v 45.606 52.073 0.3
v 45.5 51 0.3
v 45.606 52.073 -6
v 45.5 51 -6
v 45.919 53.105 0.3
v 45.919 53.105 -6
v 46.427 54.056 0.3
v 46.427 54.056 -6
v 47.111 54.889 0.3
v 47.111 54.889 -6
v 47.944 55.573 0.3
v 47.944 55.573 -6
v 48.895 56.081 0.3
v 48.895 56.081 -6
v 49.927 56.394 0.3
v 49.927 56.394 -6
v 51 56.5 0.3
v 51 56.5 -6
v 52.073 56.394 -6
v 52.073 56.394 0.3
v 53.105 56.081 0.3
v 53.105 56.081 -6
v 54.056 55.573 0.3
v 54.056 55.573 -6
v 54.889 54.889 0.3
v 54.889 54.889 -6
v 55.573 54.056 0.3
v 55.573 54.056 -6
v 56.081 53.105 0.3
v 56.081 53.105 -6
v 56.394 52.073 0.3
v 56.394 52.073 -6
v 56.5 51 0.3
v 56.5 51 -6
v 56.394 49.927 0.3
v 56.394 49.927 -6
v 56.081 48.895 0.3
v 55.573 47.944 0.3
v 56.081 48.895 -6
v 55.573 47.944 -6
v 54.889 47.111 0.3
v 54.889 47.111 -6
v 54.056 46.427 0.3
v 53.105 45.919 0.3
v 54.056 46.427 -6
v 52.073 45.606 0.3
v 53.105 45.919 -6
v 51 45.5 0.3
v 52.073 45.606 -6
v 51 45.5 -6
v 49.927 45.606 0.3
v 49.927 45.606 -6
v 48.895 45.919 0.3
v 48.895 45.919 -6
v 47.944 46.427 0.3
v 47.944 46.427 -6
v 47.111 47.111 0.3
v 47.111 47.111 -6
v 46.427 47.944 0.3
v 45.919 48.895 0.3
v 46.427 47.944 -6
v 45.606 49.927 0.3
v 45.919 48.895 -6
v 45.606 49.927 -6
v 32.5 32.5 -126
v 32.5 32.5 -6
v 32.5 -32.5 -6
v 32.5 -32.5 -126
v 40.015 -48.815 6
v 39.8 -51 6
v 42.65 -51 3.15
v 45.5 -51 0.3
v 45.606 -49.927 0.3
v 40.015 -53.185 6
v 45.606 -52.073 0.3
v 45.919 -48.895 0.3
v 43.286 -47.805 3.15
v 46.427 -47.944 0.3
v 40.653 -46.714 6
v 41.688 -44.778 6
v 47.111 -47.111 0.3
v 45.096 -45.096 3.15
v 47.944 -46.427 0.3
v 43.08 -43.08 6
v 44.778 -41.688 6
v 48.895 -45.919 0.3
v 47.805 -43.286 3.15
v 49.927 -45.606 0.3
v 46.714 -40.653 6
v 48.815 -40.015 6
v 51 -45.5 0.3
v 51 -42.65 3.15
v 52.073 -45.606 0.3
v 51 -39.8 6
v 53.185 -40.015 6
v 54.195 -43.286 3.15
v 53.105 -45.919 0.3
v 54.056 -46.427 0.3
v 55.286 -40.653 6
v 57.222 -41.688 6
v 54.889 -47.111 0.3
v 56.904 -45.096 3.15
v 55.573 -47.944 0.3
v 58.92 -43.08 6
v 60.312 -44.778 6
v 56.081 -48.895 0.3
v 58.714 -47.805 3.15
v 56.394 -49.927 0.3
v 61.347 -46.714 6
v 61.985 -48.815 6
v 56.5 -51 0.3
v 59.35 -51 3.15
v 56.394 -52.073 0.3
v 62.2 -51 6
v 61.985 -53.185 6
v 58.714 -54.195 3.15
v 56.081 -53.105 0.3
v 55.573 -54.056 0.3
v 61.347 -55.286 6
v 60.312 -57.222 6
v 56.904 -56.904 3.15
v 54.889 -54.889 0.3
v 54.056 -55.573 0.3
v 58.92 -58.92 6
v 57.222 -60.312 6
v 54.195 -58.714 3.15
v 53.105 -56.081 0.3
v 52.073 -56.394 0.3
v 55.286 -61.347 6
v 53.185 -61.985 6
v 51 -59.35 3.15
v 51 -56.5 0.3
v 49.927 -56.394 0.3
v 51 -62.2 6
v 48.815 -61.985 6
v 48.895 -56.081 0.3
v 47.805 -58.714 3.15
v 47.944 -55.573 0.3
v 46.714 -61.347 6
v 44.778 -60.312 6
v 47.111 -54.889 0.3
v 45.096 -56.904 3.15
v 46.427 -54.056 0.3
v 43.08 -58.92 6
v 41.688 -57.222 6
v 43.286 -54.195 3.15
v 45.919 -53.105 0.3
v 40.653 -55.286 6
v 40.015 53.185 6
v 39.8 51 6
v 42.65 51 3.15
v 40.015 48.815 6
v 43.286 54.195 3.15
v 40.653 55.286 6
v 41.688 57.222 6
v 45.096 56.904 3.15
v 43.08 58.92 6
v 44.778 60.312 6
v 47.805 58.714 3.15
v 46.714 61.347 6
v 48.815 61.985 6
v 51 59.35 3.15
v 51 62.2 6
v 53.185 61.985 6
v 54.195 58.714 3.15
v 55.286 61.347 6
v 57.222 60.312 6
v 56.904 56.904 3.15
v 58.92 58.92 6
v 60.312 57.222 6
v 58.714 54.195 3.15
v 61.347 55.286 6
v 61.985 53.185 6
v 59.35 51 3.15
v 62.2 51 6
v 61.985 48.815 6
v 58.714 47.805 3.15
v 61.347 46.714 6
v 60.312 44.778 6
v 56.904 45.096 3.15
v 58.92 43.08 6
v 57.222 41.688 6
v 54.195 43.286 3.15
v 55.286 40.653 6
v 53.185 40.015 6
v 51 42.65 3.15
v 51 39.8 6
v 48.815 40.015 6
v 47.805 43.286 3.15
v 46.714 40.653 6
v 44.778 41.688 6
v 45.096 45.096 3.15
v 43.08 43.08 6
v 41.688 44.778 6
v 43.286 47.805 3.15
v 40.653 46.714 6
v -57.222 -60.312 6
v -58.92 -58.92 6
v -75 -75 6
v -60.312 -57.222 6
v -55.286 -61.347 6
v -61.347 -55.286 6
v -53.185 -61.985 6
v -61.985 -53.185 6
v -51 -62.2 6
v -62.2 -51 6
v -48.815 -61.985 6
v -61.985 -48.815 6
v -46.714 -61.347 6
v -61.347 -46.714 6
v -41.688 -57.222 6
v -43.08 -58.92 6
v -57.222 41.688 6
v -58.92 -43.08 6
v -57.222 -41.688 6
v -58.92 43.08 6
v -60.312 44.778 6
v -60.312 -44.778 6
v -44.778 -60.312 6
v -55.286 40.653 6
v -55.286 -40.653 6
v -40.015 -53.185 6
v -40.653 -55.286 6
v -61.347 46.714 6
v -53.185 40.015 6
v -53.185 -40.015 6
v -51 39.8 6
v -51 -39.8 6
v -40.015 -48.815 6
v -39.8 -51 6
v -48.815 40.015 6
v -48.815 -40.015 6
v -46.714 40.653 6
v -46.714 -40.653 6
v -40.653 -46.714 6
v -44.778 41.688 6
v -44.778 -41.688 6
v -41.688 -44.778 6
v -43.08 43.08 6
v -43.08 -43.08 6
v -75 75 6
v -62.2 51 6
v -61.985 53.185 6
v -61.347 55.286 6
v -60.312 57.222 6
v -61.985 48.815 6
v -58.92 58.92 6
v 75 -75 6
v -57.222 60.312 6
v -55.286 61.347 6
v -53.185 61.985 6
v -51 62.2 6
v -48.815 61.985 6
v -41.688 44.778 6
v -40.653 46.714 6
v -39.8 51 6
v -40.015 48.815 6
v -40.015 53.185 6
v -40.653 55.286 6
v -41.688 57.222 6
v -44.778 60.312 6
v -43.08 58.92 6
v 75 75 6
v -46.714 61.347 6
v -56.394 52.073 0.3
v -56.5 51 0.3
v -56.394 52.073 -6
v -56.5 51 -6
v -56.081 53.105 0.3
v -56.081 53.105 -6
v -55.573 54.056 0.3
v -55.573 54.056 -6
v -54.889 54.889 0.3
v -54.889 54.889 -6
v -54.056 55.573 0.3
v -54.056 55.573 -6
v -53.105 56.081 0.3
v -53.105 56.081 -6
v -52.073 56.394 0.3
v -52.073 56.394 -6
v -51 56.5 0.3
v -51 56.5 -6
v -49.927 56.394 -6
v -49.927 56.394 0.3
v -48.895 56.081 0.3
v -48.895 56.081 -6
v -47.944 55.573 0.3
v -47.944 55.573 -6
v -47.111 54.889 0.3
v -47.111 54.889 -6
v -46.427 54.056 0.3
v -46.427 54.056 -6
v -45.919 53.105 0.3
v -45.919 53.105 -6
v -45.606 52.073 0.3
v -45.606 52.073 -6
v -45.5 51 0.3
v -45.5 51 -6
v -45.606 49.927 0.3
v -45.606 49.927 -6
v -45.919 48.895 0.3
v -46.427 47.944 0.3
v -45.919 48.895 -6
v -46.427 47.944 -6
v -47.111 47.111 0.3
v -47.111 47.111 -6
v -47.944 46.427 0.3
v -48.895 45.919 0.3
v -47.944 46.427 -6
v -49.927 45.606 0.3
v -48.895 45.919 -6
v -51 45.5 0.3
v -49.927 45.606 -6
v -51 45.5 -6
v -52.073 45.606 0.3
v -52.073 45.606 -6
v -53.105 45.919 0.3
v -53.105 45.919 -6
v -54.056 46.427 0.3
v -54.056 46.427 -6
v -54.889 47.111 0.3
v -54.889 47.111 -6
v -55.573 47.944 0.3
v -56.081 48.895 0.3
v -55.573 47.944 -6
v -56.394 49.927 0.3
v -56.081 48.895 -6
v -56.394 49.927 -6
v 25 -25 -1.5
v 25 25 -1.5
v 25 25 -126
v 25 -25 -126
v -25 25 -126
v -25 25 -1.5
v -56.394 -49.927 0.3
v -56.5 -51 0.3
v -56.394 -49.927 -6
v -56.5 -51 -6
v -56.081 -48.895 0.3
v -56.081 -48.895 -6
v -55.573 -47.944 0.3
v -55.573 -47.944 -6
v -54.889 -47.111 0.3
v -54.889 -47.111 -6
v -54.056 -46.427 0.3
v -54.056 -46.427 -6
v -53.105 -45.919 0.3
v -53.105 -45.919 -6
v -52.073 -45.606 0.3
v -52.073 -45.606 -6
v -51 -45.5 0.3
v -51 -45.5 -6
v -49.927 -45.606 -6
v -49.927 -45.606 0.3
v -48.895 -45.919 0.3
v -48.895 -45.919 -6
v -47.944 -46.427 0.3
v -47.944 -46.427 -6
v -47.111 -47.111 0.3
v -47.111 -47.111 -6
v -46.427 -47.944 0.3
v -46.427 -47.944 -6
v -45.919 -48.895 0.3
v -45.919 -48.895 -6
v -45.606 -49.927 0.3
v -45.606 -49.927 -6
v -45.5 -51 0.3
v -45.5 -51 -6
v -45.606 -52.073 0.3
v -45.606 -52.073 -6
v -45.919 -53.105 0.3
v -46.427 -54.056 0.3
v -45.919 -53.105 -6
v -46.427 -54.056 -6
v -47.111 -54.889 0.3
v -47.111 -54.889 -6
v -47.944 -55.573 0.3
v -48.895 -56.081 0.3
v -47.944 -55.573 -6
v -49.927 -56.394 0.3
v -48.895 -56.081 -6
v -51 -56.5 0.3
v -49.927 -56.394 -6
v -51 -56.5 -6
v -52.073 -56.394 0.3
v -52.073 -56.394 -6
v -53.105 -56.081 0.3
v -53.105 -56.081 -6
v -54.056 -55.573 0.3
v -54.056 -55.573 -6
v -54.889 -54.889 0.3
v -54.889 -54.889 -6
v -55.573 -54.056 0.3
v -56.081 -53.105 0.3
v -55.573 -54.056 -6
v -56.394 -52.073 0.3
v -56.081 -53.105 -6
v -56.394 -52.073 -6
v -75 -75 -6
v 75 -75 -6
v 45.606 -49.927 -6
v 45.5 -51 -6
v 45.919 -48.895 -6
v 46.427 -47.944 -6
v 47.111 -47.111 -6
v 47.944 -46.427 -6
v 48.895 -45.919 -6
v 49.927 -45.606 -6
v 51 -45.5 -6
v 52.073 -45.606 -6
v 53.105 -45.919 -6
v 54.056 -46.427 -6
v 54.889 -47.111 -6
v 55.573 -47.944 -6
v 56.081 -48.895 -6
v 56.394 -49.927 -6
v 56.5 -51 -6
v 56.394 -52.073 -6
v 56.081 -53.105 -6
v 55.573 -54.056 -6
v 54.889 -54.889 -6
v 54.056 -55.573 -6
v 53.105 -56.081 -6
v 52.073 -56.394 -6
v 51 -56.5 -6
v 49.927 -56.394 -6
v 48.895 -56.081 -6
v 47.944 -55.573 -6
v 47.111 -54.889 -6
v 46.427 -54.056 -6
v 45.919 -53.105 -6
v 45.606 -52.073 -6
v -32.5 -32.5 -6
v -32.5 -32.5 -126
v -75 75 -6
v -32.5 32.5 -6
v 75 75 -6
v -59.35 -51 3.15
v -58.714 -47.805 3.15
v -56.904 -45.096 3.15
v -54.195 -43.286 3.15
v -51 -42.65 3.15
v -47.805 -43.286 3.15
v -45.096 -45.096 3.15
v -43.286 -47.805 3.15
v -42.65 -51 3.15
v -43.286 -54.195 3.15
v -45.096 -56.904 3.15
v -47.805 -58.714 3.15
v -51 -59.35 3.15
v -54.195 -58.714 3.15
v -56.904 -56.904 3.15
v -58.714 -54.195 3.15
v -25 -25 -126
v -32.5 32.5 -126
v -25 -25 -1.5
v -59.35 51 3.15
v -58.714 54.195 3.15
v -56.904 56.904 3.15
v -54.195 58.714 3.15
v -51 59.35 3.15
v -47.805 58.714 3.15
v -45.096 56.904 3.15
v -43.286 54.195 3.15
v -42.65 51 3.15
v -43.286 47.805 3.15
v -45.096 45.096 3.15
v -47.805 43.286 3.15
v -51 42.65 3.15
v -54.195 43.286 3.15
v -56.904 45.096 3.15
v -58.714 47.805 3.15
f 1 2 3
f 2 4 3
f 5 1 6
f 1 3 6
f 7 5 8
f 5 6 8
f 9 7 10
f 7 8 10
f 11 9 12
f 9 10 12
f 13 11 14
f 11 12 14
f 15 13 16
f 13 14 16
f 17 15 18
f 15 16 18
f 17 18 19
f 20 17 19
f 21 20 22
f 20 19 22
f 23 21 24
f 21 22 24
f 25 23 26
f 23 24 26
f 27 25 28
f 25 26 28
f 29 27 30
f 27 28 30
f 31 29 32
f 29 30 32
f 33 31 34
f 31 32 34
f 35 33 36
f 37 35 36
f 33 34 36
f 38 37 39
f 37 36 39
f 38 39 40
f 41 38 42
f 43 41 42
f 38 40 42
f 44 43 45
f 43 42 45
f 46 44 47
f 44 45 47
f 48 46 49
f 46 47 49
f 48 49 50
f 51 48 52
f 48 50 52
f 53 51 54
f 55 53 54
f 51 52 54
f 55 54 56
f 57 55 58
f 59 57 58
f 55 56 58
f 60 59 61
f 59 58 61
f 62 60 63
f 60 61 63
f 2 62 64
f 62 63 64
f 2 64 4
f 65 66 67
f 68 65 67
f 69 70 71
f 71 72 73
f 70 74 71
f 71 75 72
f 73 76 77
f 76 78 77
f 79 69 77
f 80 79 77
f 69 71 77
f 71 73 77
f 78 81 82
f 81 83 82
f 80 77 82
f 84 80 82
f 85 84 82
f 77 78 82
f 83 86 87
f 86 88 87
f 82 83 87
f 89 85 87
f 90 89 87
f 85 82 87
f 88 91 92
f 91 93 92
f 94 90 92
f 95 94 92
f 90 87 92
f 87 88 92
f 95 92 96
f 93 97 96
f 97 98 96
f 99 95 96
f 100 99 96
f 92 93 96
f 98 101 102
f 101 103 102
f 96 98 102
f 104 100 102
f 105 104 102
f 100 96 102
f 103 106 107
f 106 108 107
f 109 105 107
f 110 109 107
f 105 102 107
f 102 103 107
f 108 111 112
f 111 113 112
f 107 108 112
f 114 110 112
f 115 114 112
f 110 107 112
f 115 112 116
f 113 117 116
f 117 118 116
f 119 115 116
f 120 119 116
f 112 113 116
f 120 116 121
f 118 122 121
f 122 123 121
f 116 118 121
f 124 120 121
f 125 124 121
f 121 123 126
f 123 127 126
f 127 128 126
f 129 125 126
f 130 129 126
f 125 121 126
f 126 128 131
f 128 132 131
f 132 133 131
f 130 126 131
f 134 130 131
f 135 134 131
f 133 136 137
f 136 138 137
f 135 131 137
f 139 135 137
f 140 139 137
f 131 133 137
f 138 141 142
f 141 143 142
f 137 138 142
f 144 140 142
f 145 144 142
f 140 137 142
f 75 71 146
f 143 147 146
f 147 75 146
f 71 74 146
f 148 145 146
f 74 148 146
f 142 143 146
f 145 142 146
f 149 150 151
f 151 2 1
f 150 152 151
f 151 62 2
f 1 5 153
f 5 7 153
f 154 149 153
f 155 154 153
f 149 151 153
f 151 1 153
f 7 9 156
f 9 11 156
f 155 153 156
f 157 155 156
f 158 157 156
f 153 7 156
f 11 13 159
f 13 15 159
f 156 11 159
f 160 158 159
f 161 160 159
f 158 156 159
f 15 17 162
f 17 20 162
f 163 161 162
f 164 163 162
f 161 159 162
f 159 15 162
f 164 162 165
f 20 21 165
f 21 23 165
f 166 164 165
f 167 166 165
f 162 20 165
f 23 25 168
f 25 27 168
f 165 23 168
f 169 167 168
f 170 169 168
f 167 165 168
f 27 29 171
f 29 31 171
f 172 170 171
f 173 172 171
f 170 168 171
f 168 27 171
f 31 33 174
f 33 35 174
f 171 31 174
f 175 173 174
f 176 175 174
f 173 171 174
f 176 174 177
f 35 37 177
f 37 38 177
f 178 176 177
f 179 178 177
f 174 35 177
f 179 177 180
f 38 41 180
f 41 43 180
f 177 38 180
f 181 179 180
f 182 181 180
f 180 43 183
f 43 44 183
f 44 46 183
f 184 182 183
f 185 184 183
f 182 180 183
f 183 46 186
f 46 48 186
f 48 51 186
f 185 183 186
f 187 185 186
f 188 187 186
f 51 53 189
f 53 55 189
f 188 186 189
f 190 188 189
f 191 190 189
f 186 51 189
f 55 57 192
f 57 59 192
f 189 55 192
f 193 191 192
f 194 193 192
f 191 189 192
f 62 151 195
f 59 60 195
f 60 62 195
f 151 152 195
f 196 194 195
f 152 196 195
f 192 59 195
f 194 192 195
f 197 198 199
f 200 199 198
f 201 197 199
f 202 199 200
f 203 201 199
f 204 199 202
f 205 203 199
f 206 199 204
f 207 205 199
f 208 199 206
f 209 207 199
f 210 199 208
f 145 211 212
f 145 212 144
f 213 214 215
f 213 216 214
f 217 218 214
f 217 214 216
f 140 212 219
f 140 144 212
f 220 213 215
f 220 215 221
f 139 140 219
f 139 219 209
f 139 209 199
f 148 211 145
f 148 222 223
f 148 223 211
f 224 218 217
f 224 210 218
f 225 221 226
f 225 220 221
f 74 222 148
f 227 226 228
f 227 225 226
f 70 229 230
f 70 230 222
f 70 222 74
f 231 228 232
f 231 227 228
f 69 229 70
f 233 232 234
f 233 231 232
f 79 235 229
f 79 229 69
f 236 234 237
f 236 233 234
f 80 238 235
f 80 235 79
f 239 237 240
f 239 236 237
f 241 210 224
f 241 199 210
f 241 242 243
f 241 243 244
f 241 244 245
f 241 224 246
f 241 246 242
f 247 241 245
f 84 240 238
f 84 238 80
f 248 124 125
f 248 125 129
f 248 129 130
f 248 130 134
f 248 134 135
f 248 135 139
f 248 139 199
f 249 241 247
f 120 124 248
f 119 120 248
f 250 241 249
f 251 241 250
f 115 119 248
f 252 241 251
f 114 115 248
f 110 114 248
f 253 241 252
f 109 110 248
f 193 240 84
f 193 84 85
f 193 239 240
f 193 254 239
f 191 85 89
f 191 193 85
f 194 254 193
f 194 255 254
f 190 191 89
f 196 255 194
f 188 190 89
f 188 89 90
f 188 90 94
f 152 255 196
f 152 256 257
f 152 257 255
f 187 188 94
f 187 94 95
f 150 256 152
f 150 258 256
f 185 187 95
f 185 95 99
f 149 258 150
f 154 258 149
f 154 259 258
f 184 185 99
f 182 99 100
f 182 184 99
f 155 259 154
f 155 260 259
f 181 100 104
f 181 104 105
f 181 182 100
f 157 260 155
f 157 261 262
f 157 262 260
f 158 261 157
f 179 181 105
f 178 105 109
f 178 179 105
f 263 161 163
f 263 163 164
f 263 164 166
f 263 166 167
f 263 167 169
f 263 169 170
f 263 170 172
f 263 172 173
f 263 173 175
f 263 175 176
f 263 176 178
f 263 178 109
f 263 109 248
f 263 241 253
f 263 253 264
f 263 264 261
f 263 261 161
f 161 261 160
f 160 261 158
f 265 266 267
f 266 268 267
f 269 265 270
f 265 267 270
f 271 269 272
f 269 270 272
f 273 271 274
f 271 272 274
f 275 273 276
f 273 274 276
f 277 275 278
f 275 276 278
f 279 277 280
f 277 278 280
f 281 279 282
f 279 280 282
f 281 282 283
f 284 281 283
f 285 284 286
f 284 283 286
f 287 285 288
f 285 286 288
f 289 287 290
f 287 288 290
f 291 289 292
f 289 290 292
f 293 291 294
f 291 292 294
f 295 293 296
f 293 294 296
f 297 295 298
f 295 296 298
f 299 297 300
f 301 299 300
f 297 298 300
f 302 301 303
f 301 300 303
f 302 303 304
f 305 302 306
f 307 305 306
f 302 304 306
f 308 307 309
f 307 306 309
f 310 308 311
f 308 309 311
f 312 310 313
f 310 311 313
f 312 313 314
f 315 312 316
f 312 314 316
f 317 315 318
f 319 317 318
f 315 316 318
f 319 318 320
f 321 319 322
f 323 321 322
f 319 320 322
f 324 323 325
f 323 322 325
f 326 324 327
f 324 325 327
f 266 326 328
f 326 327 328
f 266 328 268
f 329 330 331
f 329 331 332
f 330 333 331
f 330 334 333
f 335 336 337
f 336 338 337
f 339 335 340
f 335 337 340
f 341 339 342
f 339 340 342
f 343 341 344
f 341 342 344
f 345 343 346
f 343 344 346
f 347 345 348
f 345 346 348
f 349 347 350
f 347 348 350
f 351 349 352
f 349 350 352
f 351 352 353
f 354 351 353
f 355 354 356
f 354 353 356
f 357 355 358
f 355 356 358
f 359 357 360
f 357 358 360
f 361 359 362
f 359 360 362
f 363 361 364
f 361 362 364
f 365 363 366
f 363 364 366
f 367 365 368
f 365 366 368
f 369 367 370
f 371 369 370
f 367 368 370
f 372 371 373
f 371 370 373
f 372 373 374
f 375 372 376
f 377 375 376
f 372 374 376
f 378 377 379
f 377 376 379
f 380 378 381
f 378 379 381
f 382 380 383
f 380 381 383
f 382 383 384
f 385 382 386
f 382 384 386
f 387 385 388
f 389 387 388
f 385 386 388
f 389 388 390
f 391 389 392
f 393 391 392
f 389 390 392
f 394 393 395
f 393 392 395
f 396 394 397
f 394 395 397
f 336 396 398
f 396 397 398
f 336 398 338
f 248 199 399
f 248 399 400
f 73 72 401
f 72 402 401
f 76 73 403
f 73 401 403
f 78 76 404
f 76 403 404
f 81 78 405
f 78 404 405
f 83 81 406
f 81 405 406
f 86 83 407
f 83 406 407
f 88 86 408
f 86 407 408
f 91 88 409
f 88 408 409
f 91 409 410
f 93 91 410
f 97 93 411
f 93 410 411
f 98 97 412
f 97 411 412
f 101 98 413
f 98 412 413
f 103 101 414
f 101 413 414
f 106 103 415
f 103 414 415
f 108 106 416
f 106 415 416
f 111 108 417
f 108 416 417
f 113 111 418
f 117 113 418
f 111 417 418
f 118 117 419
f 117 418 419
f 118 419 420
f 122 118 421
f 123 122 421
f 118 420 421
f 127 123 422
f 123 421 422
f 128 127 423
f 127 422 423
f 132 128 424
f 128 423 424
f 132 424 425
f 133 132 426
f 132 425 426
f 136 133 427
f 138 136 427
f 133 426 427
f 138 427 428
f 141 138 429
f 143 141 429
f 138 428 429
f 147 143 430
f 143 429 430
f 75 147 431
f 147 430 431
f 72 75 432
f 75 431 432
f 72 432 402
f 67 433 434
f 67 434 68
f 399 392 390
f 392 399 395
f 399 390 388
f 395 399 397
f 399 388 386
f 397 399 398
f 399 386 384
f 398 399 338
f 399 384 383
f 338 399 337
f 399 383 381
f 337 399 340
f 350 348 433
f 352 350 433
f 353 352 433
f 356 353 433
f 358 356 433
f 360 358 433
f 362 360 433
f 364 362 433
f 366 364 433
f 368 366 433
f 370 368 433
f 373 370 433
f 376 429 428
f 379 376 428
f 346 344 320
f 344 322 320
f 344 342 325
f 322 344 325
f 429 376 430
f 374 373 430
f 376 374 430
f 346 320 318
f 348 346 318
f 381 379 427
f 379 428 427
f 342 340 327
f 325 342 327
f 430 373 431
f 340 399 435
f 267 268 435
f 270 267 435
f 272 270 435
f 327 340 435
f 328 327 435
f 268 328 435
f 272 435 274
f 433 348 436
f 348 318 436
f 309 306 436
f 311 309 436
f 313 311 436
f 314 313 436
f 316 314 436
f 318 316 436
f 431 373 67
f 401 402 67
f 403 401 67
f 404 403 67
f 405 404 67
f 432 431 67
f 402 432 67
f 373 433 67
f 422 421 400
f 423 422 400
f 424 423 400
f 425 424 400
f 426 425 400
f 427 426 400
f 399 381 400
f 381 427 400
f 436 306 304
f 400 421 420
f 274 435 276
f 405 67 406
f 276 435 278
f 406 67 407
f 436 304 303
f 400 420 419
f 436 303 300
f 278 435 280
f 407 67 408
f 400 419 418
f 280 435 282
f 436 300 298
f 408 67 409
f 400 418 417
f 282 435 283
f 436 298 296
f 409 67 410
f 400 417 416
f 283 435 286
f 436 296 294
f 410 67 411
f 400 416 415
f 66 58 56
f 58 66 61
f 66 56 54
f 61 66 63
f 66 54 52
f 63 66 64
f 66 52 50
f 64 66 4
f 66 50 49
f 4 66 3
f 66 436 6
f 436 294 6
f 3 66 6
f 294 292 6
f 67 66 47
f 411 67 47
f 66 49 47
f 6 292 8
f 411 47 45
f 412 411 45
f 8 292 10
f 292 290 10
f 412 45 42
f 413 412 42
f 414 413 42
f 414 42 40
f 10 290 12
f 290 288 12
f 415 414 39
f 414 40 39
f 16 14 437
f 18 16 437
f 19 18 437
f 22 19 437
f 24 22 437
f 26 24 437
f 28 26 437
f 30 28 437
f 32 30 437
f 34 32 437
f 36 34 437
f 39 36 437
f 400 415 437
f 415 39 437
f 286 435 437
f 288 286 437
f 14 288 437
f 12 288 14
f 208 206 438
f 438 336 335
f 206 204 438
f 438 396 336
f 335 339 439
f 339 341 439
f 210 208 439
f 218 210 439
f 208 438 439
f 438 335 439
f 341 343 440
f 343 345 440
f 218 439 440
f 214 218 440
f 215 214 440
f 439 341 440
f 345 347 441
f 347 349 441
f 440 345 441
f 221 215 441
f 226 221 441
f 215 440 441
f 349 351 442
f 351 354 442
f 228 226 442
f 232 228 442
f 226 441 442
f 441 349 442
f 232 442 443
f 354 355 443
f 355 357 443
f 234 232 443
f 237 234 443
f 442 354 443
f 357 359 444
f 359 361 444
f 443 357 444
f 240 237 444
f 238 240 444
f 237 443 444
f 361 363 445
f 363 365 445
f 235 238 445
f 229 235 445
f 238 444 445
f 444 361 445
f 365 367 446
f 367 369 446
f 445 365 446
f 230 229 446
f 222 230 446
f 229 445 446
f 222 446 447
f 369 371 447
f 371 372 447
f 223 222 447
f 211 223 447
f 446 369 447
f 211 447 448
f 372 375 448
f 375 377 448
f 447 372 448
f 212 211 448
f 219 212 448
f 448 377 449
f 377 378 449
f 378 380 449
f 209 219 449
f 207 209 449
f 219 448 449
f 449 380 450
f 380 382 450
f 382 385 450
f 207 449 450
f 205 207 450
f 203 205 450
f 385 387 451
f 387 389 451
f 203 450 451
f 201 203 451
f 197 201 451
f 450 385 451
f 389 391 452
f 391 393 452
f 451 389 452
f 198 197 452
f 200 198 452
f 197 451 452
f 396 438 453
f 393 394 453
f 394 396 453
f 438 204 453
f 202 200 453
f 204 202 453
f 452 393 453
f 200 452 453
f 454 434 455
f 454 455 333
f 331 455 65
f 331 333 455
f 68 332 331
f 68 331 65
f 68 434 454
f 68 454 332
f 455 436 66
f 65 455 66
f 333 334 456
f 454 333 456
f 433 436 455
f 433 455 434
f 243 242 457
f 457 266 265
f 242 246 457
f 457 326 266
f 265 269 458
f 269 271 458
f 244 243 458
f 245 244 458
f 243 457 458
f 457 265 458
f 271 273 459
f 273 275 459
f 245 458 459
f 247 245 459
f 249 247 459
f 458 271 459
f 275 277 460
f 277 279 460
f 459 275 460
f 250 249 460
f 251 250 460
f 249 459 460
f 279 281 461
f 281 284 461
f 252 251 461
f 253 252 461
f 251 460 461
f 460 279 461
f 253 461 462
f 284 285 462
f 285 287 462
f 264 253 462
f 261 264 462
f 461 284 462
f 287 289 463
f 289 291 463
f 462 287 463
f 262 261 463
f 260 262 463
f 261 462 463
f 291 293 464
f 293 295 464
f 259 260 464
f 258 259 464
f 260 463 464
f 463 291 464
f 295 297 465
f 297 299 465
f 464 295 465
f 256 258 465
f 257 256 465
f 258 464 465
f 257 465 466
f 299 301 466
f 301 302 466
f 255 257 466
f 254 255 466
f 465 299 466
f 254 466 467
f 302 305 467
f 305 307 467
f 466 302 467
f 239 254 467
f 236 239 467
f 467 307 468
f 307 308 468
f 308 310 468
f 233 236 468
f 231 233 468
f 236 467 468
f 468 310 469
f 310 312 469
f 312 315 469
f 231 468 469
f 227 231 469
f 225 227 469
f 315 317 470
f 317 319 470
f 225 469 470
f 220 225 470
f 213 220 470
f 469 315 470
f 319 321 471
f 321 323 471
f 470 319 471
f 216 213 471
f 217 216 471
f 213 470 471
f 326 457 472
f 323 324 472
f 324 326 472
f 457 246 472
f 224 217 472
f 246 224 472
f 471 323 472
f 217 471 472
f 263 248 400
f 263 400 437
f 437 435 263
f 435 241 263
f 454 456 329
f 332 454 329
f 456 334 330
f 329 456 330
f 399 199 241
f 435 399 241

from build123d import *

# Parameters (mm, degrees)
F0_W           = 150
F0_H           = 150
F1_DEPTH       = 6
F1_DEPTH_BACK  = 6
F3_D           = 11
F3_CSINK_D     = 22.4
F3_CSINK_ANGLE = 90
F4_W           = 65
F4_H           = 65
F5_DEPTH       = 120
F6_T           = -7.5


with BuildPart() as f1:
    # F0 (on Top) → F1 (new body, two sides)
    with BuildSketch(Plane.XY) as f1_sk:
        Rectangle(F0_W, F0_H)
    extrude(amount=F1_DEPTH)
    extrude(f1_sk.sketch, amount=-F1_DEPTH_BACK)

    # F3 (through all)
    with Locations(Plane.XY.offset(6)):
        with Locations((-51, 51), (51, 51), (51, -51), (-51, -51)):
            CounterSinkHole(F3_D / 2, F3_CSINK_D / 2, counter_sink_angle=F3_CSINK_ANGLE)

    # F4 (on face) → F5 (join)
    with BuildSketch(Plane(origin=(0, 0, -6), x_dir=(1, 0, 0), z_dir=(0, 0, -1))):
        Rectangle(F4_W, F4_H)
    extrude(amount=F5_DEPTH)

    # F6
    f6_openings = [f1.faces().sort_by_distance(p)[0] for p in [
        (0, 0, -126),
    ]]
    offset(amount=F6_T, openings=f6_openings, kind=Kind.INTERSECTION)


solid = f1.part
